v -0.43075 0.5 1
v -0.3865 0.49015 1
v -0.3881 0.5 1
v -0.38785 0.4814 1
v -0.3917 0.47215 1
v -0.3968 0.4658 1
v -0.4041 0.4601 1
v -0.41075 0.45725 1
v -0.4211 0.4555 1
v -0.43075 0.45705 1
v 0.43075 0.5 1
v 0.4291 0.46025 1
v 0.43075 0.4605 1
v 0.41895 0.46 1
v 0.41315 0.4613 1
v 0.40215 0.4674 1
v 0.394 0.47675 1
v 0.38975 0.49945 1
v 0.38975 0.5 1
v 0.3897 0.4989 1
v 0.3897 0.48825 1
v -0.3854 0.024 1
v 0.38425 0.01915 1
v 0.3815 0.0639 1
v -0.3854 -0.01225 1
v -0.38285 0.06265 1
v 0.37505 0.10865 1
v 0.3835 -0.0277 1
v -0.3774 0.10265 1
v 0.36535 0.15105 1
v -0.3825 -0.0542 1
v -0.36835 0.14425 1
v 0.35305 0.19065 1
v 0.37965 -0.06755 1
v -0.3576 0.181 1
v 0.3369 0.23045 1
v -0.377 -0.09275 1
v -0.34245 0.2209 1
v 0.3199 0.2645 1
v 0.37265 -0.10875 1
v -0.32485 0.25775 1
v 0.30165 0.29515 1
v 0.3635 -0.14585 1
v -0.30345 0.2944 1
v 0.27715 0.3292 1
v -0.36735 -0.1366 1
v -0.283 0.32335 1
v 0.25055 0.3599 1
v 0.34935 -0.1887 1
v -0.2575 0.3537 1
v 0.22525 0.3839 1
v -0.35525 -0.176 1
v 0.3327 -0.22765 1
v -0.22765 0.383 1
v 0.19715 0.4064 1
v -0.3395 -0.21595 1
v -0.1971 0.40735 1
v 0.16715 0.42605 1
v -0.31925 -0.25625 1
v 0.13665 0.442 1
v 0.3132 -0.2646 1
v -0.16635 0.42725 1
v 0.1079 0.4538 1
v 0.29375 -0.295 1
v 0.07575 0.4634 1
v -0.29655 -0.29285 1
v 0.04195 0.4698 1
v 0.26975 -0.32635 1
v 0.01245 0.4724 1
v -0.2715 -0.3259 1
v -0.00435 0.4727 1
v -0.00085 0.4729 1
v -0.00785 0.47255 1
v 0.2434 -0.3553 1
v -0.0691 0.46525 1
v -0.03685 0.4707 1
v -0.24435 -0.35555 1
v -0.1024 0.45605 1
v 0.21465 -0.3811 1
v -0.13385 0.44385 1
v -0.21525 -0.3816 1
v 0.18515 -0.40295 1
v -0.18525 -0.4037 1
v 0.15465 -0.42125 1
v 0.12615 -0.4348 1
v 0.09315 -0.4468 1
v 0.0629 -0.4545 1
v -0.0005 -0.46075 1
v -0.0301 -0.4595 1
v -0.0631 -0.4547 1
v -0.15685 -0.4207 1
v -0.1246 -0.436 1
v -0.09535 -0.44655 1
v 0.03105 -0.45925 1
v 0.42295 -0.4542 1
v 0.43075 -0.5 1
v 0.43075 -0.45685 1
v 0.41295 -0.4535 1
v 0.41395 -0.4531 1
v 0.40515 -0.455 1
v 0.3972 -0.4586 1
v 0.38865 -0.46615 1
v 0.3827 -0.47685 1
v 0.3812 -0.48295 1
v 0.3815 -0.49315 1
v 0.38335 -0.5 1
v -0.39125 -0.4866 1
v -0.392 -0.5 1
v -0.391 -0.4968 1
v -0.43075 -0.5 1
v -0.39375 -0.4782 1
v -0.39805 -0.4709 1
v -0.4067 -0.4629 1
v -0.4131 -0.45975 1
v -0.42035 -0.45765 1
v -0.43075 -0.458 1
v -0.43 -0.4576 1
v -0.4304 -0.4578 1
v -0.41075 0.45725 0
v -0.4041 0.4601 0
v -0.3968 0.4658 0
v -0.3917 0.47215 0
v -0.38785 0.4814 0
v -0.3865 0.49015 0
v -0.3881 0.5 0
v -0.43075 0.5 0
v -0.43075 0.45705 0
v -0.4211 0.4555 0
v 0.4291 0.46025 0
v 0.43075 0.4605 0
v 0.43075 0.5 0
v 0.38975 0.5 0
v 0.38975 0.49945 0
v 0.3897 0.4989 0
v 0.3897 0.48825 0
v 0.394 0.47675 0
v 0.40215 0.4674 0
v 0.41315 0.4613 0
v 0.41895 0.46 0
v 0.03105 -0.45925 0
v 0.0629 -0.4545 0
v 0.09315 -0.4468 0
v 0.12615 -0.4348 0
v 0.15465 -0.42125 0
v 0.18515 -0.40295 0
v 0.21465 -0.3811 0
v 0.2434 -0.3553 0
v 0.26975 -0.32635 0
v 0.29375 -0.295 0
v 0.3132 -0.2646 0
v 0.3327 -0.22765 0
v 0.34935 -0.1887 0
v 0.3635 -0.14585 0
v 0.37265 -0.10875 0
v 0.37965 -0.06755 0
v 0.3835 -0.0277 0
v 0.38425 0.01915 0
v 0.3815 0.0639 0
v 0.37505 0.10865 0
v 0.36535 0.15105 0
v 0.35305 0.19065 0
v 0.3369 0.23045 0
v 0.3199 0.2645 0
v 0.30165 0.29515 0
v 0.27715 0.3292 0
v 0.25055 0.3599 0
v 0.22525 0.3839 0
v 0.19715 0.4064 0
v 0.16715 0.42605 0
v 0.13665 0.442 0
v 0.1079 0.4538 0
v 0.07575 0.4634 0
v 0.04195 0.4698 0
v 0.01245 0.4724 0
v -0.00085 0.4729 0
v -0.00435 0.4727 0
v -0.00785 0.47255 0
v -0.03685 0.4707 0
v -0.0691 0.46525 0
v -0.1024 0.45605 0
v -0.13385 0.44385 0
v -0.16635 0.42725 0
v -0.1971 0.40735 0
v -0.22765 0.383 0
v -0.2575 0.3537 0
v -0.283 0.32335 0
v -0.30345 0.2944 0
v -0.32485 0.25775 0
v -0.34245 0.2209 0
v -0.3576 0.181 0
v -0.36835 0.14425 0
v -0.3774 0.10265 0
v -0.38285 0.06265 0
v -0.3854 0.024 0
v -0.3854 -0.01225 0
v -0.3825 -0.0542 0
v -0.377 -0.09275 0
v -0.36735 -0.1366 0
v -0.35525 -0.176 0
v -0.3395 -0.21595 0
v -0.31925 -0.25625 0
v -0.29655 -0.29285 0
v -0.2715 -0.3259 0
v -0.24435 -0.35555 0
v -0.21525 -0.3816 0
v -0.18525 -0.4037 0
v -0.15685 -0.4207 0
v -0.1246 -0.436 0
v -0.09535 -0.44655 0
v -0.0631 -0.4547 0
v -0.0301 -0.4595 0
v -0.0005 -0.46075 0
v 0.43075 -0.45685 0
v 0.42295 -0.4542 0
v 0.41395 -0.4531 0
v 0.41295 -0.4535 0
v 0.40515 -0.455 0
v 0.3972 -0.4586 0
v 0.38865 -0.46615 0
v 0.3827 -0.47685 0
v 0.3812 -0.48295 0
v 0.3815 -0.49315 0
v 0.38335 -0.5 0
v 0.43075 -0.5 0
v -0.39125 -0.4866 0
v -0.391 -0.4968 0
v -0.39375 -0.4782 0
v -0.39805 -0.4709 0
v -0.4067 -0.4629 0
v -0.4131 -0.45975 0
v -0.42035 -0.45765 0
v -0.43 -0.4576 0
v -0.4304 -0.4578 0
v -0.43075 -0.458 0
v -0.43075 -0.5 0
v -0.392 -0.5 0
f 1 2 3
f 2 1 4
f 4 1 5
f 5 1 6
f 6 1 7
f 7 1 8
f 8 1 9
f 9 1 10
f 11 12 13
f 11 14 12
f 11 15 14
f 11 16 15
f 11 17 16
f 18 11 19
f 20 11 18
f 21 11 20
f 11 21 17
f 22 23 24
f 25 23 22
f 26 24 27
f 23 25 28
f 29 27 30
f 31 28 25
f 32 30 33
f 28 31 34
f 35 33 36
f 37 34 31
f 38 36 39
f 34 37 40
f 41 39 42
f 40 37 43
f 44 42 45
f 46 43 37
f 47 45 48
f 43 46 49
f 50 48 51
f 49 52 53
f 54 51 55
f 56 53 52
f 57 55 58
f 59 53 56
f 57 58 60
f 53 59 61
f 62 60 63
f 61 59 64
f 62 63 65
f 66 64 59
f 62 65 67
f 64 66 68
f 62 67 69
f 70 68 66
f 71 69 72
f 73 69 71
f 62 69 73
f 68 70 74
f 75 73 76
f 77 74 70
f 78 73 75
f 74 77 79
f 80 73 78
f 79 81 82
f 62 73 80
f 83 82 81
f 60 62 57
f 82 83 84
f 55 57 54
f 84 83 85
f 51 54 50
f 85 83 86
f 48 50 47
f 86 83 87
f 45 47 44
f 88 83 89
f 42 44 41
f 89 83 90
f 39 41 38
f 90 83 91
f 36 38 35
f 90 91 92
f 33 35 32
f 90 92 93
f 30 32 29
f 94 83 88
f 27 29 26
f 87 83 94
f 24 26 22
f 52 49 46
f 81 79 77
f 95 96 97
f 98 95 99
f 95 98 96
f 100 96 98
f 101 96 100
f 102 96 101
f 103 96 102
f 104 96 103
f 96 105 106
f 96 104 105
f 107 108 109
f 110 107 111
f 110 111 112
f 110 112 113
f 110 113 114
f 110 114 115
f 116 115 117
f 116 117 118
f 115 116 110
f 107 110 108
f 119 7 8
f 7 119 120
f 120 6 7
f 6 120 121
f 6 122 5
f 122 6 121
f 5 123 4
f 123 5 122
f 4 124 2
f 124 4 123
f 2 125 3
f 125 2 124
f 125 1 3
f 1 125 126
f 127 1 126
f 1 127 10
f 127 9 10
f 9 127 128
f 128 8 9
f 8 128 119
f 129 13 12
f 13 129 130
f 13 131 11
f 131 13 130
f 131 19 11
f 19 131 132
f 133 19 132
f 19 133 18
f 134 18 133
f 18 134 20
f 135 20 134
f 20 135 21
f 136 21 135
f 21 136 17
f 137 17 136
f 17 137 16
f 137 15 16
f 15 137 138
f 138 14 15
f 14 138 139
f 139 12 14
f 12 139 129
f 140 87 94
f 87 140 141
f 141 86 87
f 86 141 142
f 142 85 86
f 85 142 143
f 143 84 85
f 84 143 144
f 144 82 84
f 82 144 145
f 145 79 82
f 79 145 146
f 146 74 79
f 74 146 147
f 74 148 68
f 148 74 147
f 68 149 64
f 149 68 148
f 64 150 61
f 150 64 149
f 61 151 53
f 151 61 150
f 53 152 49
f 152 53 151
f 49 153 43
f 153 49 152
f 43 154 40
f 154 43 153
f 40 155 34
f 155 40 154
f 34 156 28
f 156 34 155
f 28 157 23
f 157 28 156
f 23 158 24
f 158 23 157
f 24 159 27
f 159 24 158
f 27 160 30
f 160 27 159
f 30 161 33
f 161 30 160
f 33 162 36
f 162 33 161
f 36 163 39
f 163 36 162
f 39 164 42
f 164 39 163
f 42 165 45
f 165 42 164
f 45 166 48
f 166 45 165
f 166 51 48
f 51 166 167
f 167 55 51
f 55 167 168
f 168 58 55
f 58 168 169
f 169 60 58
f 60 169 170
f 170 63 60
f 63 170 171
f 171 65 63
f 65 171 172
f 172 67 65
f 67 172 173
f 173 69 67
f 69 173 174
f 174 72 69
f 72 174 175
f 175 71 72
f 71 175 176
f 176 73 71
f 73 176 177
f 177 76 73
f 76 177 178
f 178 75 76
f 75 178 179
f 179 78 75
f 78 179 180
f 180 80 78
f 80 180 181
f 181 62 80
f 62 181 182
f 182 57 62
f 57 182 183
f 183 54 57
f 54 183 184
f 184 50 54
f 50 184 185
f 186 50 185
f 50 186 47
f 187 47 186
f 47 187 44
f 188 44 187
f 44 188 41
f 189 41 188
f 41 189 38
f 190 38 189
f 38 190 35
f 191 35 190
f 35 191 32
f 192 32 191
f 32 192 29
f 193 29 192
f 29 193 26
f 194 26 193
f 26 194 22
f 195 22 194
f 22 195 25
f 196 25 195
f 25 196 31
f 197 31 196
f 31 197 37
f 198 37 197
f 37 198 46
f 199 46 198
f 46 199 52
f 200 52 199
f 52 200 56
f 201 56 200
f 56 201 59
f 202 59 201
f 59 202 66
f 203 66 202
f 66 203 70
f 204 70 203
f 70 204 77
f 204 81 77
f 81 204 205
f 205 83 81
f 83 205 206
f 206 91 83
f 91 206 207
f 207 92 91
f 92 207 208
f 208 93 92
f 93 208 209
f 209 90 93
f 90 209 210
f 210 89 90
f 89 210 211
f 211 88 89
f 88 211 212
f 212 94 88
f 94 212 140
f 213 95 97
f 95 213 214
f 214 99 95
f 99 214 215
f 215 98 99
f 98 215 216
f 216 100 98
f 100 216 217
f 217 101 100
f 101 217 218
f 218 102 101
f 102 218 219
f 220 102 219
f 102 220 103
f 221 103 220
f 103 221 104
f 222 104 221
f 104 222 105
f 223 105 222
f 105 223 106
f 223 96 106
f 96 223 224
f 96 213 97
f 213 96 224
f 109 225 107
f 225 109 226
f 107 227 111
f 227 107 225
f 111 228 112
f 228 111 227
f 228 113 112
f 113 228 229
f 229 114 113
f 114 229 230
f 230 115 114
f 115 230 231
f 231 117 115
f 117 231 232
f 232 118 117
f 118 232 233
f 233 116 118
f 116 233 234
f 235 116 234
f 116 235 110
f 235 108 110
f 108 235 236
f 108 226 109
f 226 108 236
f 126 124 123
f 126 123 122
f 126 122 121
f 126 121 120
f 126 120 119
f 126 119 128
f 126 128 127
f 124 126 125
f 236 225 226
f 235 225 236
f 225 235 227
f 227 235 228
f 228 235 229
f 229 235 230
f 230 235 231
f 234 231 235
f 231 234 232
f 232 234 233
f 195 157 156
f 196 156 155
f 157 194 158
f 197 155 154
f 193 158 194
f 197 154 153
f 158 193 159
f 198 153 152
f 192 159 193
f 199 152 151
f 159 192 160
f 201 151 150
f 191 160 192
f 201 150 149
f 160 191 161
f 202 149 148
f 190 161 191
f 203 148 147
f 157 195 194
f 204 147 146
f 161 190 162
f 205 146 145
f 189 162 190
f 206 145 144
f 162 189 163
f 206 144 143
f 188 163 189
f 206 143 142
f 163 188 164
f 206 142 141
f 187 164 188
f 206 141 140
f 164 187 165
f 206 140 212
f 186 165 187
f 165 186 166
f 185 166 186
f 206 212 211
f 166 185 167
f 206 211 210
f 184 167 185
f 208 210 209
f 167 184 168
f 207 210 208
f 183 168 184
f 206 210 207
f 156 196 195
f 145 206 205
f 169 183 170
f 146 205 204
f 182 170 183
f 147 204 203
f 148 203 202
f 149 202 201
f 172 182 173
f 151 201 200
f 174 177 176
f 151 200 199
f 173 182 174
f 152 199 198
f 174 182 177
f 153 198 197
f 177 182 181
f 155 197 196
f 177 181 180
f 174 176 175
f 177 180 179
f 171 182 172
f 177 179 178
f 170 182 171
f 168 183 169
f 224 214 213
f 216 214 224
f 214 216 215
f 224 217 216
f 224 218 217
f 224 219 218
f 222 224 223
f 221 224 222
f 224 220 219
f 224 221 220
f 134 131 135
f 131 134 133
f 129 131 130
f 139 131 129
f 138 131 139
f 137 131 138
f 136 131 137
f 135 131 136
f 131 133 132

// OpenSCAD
module Hedwig2black_1()
{
 /* Generated by trace2scad version 20150415
    http://aggregate.org/MAKE/TRACE2SCAD/
    Optimized model has 120/1639 original points
 */
 color([0.5, 0.5, 0.5])
 assign(minx=0) /* polygon minx=0 */
 assign(miny=0) /* polygon miny=0 */
 assign(maxx=17230) /* polygon maxx=17230 */
 assign(maxy=20000) /* polygon maxy=20000 */
 assign(dx=maxx-minx)
 assign(dy=maxy-miny)
 assign(maxd=((dx>dy)?dx:dy))
 scale([1/maxd, 1/maxd, 1])
 translate([-minx-dx/2, -miny-dy/2, 0])
 linear_extrude(height=1, convexity=120)
 union() {
  union() {
   polygon([[0,19571],[0,19141],[193,19110],[400,19145],[533,19202],[679,19316],[781,19443],[858,19628],[885,19803],[853,20000],[0,20000]], convexity=5);
   polygon([[16410,19989],[16409,19978],[16409,19765],[16495,19535],[16658,19348],[16878,19226],[16994,19200],[17197,19205],[17230,19210],[17230,20000],[16410,20000]], convexity=6);
   polygon([[8528,19454],[8458,19451],[7878,19414],[7233,19305],[6567,19121],[5938,18877],[5288,18545],[4673,18147],[4062,17660],[3465,17074],[2955,16467],[2546,15888],[2118,15155],[1766,14418],[1463,13620],[1248,12885],[1067,12053],[958,11253],[907,10480],[907,9755],[965,8916],[1075,8145],[1268,7268],[1510,6480],[1825,5681],[2230,4875],[2684,4143],[3185,3482],[3728,2889],[4310,2368],[4910,1926],[5478,1586],[6123,1280],[6708,1069],[7353,906],[8013,810],[8605,785],[9236,815],[9873,910],[10478,1064],[11138,1304],[11708,1575],[12318,1941],[12908,2378],[13483,2894],[14010,3473],[14490,4100],[14879,4708],[15269,5447],[15602,6226],[15885,7083],[16068,7825],[16208,8649],[16285,9446],[16300,10383],[16245,11278],[16116,12173],[15922,13021],[15676,13813],[15353,14609],[15013,15290],[14648,15903],[14158,16584],[13626,17198],[13120,17678],[12558,18128],[11958,18521],[11348,18840],[10773,19076],[10130,19268],[9454,19396],[8864,19448],[8598,19458]], convexity=6);
   polygon([[16884,934],[16874,930],[16718,900],[16559,828],[16388,677],[16269,463],[16239,341],[16245,137],[16282,0],[17230,0],[17230,863],[17074,916],[16894,938]], convexity=6);
   polygon([[7,844],[0,840],[0,0],[775,0],[795,64],[790,268],[740,436],[654,582],[481,742],[353,805],[208,847],[15,848]], convexity=6);
  }
 }
}

module Hedwig2black()
{
 /* all layers combined, scaled to within a 1mm cube */
 scale([1, 1, 1/1])
 difference() {
  union() {
   scale([1,1,2]) translate([0,0,-0.5]) Hedwig2black_1();
  }
  translate([0,0,-2]) cube([2,2,4],center=true);
 }
}
Hedwig2black();
